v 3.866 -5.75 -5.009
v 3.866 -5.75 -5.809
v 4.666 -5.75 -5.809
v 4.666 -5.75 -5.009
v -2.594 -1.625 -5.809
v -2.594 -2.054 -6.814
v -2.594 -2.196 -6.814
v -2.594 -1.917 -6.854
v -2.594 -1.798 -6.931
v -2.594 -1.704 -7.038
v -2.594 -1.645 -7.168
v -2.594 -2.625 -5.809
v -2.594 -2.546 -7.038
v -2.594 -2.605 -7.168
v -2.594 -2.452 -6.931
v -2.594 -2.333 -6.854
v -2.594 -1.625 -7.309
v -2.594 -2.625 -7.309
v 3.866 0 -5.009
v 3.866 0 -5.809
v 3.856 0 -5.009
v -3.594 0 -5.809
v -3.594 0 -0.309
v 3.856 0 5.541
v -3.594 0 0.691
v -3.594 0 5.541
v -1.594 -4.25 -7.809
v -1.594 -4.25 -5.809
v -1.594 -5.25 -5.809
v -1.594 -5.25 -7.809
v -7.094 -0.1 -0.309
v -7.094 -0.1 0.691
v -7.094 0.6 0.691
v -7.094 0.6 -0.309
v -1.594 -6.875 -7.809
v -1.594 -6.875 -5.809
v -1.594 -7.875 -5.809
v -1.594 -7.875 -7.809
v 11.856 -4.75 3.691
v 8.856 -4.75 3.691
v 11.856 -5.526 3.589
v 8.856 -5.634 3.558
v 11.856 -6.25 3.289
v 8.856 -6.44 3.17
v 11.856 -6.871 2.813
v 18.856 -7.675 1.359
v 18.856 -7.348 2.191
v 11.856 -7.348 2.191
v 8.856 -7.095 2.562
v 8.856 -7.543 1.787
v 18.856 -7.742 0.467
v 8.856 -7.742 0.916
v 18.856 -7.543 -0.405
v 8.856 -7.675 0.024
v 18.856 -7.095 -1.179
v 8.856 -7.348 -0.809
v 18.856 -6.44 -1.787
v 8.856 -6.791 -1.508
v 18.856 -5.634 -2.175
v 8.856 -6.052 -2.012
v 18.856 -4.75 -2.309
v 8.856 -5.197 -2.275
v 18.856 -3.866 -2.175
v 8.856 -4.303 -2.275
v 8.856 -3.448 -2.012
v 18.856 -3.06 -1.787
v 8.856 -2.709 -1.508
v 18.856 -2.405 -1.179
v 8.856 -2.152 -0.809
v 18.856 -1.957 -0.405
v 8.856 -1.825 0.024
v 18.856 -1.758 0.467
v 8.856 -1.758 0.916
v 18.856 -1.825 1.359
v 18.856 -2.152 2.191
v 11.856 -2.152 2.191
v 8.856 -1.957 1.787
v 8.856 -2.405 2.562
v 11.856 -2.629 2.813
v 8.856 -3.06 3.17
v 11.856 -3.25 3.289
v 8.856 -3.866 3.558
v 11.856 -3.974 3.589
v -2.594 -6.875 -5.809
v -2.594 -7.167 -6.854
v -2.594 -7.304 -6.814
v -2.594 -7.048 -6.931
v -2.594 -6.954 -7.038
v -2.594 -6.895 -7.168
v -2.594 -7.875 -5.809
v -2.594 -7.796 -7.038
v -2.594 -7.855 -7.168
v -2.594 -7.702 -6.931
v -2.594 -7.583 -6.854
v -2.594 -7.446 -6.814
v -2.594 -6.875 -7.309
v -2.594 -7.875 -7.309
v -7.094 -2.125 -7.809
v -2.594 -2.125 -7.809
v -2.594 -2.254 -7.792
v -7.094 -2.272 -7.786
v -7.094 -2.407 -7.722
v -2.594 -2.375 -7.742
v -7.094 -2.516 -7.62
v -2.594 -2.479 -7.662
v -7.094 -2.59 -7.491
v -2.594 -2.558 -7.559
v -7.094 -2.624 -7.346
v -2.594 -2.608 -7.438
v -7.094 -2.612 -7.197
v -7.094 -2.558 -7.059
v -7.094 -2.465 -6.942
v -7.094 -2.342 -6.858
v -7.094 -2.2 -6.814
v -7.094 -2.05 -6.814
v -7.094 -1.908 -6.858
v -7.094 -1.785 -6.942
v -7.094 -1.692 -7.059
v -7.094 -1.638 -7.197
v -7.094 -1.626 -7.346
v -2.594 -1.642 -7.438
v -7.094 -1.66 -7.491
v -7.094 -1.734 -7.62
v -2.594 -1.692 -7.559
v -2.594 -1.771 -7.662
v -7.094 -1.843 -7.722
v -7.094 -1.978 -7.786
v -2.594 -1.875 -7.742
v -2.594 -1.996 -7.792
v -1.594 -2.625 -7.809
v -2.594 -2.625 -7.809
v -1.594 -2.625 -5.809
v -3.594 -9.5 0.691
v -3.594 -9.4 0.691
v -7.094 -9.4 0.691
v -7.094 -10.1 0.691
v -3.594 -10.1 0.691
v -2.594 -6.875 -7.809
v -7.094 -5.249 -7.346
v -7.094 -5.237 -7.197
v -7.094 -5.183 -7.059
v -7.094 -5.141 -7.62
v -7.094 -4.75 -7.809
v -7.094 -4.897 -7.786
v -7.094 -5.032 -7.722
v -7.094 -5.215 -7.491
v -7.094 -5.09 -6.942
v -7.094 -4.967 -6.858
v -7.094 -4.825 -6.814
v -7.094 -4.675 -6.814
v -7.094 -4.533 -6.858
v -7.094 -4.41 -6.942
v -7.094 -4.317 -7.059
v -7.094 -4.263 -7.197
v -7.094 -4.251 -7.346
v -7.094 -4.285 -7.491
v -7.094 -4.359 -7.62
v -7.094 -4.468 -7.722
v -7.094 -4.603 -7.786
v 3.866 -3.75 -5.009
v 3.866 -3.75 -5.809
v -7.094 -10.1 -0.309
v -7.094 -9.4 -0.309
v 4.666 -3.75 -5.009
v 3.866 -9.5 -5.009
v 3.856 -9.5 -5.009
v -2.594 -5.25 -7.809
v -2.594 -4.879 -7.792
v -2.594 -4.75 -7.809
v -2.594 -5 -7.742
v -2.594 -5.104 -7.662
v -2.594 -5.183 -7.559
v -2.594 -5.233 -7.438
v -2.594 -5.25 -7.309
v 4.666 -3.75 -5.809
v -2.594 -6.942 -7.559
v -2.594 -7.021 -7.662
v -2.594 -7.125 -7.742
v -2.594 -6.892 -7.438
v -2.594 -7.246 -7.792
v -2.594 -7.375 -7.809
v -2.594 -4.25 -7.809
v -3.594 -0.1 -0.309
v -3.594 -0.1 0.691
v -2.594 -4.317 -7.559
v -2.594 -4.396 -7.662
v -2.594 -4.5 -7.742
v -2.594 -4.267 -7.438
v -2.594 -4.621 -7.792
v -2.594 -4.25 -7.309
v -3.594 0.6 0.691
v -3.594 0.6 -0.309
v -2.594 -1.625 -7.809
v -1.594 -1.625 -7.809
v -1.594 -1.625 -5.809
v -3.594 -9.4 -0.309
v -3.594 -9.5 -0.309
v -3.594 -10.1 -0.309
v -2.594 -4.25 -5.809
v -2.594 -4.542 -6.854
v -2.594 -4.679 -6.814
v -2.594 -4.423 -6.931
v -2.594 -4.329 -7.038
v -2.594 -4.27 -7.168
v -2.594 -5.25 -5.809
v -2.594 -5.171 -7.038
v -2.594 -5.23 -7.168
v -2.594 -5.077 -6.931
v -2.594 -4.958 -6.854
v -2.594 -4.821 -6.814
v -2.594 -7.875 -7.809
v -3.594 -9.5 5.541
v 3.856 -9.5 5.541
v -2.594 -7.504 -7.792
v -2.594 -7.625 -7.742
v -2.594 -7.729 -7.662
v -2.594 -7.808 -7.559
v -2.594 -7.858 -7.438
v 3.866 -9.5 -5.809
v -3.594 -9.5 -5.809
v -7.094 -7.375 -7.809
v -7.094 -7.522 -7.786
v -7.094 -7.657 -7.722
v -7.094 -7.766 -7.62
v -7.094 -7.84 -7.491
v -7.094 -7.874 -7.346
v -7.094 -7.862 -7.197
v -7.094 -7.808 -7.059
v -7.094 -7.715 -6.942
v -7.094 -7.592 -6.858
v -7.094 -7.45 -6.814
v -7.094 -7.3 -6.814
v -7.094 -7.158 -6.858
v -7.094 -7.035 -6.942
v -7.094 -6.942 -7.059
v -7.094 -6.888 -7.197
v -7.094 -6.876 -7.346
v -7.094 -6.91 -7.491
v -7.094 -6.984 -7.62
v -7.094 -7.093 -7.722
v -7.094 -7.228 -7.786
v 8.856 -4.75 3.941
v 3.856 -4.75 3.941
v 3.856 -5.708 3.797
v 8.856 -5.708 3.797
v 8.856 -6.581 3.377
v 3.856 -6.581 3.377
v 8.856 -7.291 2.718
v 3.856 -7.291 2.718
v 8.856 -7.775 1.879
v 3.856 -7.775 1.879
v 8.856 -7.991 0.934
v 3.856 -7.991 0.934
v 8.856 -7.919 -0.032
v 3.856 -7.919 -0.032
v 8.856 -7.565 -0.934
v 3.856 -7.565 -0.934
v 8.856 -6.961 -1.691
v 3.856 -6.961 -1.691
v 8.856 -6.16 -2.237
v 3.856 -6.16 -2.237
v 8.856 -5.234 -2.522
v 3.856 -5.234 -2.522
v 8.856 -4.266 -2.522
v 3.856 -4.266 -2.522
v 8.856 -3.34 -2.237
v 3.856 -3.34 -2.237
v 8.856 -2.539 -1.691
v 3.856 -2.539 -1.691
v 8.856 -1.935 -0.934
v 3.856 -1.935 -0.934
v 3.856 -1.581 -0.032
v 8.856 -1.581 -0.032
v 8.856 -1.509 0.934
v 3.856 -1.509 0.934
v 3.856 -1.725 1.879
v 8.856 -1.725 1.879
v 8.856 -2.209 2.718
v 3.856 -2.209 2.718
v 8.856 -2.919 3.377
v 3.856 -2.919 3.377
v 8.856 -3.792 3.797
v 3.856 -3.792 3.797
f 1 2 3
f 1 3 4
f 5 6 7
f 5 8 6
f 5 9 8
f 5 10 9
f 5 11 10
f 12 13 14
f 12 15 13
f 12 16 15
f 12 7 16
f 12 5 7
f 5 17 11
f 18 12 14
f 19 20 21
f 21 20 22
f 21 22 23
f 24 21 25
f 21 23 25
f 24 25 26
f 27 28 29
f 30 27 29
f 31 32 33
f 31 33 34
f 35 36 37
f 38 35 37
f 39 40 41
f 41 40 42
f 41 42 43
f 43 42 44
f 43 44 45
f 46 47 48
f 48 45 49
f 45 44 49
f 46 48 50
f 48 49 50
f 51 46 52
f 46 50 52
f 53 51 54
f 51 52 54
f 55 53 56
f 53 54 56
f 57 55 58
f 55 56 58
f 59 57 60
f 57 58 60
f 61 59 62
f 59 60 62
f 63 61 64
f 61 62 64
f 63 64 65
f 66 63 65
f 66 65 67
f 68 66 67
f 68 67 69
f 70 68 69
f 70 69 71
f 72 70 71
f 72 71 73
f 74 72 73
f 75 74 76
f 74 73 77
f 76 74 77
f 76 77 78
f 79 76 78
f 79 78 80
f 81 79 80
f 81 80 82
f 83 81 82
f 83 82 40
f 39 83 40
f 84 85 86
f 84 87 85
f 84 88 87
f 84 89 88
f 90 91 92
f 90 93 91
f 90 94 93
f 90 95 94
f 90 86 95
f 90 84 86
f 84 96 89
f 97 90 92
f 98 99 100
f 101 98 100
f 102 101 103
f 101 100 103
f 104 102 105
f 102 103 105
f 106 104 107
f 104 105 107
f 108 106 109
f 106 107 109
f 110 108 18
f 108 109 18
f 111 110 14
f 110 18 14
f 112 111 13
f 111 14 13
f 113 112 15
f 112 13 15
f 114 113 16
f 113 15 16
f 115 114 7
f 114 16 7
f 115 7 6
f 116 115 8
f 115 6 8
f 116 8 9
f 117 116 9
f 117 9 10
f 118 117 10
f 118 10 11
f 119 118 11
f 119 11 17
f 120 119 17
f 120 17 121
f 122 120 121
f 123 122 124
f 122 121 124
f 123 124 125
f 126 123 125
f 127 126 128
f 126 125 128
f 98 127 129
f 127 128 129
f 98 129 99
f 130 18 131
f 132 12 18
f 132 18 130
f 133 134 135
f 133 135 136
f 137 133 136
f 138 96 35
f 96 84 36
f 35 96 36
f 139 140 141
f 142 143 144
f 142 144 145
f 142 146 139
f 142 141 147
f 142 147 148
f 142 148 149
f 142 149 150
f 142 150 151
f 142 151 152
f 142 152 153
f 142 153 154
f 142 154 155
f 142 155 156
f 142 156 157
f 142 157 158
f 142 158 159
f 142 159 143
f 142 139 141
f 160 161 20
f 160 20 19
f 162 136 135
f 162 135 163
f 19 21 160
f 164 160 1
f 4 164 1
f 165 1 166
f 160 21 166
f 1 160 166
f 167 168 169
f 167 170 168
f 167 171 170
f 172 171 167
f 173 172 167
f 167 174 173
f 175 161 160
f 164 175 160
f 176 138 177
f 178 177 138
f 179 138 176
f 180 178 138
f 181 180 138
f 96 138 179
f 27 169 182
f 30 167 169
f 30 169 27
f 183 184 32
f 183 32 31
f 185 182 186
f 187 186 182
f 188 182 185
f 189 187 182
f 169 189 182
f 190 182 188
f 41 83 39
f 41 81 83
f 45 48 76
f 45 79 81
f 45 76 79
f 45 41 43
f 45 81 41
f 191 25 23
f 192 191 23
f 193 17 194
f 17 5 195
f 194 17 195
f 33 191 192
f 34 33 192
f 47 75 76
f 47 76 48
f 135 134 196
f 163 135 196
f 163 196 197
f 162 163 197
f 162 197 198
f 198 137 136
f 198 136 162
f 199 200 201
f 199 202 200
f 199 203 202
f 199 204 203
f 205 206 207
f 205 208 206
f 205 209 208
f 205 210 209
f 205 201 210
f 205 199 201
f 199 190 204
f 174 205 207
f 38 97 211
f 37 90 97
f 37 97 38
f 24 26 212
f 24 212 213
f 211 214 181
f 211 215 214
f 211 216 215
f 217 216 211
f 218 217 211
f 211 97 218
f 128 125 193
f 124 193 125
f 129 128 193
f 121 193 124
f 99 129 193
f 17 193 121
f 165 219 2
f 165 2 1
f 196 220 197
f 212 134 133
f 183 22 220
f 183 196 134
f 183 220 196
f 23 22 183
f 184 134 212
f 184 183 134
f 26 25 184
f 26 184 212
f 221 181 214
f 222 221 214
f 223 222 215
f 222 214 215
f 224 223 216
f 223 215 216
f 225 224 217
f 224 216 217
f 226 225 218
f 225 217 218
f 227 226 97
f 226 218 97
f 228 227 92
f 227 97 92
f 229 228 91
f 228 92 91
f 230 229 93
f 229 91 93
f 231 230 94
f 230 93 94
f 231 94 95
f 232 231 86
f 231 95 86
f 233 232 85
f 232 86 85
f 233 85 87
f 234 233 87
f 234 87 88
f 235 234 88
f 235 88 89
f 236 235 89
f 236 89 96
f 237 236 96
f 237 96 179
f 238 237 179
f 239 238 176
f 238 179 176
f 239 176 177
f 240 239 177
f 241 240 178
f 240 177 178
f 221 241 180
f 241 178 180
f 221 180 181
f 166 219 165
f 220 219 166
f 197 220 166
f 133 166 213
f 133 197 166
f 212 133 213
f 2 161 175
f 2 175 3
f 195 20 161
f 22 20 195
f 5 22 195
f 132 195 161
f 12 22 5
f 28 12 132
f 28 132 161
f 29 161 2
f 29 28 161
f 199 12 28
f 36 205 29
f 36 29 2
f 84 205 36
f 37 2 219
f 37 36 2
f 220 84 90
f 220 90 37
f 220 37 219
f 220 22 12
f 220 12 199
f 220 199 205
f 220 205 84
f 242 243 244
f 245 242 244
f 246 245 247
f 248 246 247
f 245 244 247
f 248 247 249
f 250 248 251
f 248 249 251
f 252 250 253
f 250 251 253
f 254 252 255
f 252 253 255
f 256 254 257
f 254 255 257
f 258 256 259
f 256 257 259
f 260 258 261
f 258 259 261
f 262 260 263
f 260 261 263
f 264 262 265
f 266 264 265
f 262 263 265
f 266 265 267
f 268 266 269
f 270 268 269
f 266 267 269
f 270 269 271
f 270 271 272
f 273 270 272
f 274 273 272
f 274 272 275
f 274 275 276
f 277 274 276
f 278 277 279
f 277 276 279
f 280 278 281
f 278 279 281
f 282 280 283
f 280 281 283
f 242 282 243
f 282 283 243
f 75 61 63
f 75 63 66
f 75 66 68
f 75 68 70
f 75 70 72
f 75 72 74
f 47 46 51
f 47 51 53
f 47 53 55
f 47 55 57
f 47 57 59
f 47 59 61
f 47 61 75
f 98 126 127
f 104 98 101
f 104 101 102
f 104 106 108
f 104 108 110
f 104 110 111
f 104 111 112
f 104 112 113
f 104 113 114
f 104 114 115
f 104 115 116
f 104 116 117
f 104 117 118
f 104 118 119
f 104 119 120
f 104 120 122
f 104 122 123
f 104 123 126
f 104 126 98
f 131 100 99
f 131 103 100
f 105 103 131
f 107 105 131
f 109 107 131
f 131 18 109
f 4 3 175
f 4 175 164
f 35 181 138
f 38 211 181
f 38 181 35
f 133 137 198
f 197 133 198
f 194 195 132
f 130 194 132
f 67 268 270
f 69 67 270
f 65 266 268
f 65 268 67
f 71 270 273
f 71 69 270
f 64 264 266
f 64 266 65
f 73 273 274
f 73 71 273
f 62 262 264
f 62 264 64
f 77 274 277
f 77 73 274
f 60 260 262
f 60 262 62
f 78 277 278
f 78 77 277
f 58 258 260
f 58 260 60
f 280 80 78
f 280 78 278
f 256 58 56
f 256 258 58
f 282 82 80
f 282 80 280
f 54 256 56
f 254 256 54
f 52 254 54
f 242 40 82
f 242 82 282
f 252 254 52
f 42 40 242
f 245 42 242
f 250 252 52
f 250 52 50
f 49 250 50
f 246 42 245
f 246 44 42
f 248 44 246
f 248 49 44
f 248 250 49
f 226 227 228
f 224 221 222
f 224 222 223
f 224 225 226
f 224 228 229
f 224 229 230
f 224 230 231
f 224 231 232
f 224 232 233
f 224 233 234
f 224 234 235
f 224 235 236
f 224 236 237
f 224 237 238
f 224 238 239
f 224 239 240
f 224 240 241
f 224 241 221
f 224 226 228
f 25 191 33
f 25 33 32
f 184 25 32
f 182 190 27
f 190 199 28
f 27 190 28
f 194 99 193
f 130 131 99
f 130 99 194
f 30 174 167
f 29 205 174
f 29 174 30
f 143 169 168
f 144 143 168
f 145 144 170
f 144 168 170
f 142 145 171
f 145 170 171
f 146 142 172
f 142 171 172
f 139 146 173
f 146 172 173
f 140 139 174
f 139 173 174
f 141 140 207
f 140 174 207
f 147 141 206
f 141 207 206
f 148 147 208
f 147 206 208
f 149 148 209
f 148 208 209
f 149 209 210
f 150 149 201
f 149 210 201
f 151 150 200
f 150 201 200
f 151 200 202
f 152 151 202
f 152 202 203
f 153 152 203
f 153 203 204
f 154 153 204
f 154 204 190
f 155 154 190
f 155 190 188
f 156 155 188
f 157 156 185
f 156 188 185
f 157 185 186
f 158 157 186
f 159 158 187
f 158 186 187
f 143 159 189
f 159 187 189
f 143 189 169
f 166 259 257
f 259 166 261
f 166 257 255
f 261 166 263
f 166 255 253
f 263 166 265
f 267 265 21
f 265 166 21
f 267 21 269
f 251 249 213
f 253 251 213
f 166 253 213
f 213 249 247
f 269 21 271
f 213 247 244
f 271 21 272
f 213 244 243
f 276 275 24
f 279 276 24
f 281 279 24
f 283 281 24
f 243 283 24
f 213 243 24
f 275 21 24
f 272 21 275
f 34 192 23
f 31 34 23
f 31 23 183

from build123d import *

# Parameters (mm, degrees)
SKETCH_W     = 7.45
SKETCH_H     = 11.35
PAD_DEPTH    = 9.5
SKETCH001_W  = 0.8
SKETCH001_H  = 9.5
PAD001_DEPTH = 0.01
SKETCH005_W  = 0.8
SKETCH005_H  = 2
PAD004_DEPTH = 0.8
SKETCH006_W  = 1
SKETCH006_H  = 0.7
PAD005_DEPTH = 3.5
SKETCH002_R  = 3
PAD002_DEPTH = 15
SKETCH003_W  = 3.35
SKETCH003_H  = 9.5
POCKET_DEPTH = 7
SKETCH004_R  = 3.25
PAD003_DEPTH = 5
SKETCH007_W  = 1
SKETCH007_H  = 1
PAD006_DEPTH = 2
SKETCH008_R  = 0.5
PAD007_DEPTH = 4.5


with BuildPart() as pad001:
    # Sketch → Pad (new body)
    with BuildSketch(Plane.XZ):
        with Locations((0.130678, -0.133685)):
            Rectangle(SKETCH_W, SKETCH_H)
    extrude(amount=PAD_DEPTH)

    # Sketch001 → Pad001 (new body)
    with BuildSketch(Plane(origin=(3.855678, 0, 0), x_dir=(0, 0, 1), z_dir=(1, 0, 0))):
        with Locations((-5.408685, 4.75)):
            Rectangle(SKETCH001_W, SKETCH001_H)
    extrude(amount=PAD001_DEPTH)


with BuildPart() as pad005:
    # Pad004 base: copy of Pad001
    add(pad001.part)

    # Sketch005 → Pad004 (new body)
    with BuildSketch(Plane(origin=(3.865678, 0, 0), x_dir=(0, 0, 1), z_dir=(1, 0, 0))):
        with Locations((-5.408685, 4.75)):
            Rectangle(SKETCH005_W, SKETCH005_H)
    extrude(amount=PAD004_DEPTH)

    # Sketch006 → Pad005 (new body)
    with BuildSketch(Plane(origin=(-3.594322, 0, 0), x_dir=(0, 0, -1), z_dir=(-1, 0, 0))):
        with Locations((-0.191315, 9.75)):
            Rectangle(SKETCH006_W, SKETCH006_H)
        with Locations((-0.191315, -0.25)):
            Rectangle(SKETCH006_W, SKETCH006_H)
    extrude(amount=PAD005_DEPTH)


with BuildPart() as fusion:
    # Pad002 base: copy of Pad001
    add(pad001.part)

    # Sketch002 → Pad002 (new body)
    with BuildSketch(Plane(origin=(3.855678, 0, 0), x_dir=(0, 0, 1), z_dir=(1, 0, 0))):
        with Locations((0.691315, 4.75)):
            Circle(SKETCH002_R)
    extrude(amount=PAD002_DEPTH)

    # Sketch003 → Pocket (cut)
    with BuildSketch(Plane(origin=(18.855678, 0, 0), x_dir=(0, 0, 1), z_dir=(1, 0, 0))):
        with Locations((3.866315, 4.75)):
            Rectangle(SKETCH003_W, SKETCH003_H)
    extrude(amount=-POCKET_DEPTH, mode=Mode.SUBTRACT)

    # Sketch004 → Pad003 (new body)
    with BuildSketch(Plane(origin=(3.855678, 0, 0), x_dir=(0, 0, 1), z_dir=(1, 0, 0))):
        with Locations((0.691315, 4.75)):
            Circle(SKETCH004_R)
    extrude(amount=PAD003_DEPTH)

    # Sketch007 → Pad006 (new body)
    with BuildSketch(Plane(origin=(0, 0, -5.808685), x_dir=(1, 0, 0), z_dir=(0, 0, -1))):
        with Locations((-2.094322, 7.375)):
            Rectangle(SKETCH007_W, SKETCH007_H)
        with Locations((-2.094322, 4.75)):
            Rectangle(SKETCH007_W, SKETCH007_H)
        with Locations((-2.094322, 2.125)):
            Rectangle(SKETCH007_W, SKETCH007_H)
    extrude(amount=PAD006_DEPTH)

    # Sketch008 → Pad007 (new body)
    with BuildSketch(Plane(origin=(-2.594322, 0, 0), x_dir=(0, 0, -1), z_dir=(-1, 0, 0))):
        with Locations((7.308685, 4.75)):
            Circle(SKETCH008_R)
        with Locations((7.308685, 7.375)):
            Circle(SKETCH008_R)
        with Locations((7.308685, 2.125)):
            Circle(SKETCH008_R)
    extrude(amount=PAD007_DEPTH)

    # Fusion: union Pad005
    add(pad005.part)


solid = fusion.part
